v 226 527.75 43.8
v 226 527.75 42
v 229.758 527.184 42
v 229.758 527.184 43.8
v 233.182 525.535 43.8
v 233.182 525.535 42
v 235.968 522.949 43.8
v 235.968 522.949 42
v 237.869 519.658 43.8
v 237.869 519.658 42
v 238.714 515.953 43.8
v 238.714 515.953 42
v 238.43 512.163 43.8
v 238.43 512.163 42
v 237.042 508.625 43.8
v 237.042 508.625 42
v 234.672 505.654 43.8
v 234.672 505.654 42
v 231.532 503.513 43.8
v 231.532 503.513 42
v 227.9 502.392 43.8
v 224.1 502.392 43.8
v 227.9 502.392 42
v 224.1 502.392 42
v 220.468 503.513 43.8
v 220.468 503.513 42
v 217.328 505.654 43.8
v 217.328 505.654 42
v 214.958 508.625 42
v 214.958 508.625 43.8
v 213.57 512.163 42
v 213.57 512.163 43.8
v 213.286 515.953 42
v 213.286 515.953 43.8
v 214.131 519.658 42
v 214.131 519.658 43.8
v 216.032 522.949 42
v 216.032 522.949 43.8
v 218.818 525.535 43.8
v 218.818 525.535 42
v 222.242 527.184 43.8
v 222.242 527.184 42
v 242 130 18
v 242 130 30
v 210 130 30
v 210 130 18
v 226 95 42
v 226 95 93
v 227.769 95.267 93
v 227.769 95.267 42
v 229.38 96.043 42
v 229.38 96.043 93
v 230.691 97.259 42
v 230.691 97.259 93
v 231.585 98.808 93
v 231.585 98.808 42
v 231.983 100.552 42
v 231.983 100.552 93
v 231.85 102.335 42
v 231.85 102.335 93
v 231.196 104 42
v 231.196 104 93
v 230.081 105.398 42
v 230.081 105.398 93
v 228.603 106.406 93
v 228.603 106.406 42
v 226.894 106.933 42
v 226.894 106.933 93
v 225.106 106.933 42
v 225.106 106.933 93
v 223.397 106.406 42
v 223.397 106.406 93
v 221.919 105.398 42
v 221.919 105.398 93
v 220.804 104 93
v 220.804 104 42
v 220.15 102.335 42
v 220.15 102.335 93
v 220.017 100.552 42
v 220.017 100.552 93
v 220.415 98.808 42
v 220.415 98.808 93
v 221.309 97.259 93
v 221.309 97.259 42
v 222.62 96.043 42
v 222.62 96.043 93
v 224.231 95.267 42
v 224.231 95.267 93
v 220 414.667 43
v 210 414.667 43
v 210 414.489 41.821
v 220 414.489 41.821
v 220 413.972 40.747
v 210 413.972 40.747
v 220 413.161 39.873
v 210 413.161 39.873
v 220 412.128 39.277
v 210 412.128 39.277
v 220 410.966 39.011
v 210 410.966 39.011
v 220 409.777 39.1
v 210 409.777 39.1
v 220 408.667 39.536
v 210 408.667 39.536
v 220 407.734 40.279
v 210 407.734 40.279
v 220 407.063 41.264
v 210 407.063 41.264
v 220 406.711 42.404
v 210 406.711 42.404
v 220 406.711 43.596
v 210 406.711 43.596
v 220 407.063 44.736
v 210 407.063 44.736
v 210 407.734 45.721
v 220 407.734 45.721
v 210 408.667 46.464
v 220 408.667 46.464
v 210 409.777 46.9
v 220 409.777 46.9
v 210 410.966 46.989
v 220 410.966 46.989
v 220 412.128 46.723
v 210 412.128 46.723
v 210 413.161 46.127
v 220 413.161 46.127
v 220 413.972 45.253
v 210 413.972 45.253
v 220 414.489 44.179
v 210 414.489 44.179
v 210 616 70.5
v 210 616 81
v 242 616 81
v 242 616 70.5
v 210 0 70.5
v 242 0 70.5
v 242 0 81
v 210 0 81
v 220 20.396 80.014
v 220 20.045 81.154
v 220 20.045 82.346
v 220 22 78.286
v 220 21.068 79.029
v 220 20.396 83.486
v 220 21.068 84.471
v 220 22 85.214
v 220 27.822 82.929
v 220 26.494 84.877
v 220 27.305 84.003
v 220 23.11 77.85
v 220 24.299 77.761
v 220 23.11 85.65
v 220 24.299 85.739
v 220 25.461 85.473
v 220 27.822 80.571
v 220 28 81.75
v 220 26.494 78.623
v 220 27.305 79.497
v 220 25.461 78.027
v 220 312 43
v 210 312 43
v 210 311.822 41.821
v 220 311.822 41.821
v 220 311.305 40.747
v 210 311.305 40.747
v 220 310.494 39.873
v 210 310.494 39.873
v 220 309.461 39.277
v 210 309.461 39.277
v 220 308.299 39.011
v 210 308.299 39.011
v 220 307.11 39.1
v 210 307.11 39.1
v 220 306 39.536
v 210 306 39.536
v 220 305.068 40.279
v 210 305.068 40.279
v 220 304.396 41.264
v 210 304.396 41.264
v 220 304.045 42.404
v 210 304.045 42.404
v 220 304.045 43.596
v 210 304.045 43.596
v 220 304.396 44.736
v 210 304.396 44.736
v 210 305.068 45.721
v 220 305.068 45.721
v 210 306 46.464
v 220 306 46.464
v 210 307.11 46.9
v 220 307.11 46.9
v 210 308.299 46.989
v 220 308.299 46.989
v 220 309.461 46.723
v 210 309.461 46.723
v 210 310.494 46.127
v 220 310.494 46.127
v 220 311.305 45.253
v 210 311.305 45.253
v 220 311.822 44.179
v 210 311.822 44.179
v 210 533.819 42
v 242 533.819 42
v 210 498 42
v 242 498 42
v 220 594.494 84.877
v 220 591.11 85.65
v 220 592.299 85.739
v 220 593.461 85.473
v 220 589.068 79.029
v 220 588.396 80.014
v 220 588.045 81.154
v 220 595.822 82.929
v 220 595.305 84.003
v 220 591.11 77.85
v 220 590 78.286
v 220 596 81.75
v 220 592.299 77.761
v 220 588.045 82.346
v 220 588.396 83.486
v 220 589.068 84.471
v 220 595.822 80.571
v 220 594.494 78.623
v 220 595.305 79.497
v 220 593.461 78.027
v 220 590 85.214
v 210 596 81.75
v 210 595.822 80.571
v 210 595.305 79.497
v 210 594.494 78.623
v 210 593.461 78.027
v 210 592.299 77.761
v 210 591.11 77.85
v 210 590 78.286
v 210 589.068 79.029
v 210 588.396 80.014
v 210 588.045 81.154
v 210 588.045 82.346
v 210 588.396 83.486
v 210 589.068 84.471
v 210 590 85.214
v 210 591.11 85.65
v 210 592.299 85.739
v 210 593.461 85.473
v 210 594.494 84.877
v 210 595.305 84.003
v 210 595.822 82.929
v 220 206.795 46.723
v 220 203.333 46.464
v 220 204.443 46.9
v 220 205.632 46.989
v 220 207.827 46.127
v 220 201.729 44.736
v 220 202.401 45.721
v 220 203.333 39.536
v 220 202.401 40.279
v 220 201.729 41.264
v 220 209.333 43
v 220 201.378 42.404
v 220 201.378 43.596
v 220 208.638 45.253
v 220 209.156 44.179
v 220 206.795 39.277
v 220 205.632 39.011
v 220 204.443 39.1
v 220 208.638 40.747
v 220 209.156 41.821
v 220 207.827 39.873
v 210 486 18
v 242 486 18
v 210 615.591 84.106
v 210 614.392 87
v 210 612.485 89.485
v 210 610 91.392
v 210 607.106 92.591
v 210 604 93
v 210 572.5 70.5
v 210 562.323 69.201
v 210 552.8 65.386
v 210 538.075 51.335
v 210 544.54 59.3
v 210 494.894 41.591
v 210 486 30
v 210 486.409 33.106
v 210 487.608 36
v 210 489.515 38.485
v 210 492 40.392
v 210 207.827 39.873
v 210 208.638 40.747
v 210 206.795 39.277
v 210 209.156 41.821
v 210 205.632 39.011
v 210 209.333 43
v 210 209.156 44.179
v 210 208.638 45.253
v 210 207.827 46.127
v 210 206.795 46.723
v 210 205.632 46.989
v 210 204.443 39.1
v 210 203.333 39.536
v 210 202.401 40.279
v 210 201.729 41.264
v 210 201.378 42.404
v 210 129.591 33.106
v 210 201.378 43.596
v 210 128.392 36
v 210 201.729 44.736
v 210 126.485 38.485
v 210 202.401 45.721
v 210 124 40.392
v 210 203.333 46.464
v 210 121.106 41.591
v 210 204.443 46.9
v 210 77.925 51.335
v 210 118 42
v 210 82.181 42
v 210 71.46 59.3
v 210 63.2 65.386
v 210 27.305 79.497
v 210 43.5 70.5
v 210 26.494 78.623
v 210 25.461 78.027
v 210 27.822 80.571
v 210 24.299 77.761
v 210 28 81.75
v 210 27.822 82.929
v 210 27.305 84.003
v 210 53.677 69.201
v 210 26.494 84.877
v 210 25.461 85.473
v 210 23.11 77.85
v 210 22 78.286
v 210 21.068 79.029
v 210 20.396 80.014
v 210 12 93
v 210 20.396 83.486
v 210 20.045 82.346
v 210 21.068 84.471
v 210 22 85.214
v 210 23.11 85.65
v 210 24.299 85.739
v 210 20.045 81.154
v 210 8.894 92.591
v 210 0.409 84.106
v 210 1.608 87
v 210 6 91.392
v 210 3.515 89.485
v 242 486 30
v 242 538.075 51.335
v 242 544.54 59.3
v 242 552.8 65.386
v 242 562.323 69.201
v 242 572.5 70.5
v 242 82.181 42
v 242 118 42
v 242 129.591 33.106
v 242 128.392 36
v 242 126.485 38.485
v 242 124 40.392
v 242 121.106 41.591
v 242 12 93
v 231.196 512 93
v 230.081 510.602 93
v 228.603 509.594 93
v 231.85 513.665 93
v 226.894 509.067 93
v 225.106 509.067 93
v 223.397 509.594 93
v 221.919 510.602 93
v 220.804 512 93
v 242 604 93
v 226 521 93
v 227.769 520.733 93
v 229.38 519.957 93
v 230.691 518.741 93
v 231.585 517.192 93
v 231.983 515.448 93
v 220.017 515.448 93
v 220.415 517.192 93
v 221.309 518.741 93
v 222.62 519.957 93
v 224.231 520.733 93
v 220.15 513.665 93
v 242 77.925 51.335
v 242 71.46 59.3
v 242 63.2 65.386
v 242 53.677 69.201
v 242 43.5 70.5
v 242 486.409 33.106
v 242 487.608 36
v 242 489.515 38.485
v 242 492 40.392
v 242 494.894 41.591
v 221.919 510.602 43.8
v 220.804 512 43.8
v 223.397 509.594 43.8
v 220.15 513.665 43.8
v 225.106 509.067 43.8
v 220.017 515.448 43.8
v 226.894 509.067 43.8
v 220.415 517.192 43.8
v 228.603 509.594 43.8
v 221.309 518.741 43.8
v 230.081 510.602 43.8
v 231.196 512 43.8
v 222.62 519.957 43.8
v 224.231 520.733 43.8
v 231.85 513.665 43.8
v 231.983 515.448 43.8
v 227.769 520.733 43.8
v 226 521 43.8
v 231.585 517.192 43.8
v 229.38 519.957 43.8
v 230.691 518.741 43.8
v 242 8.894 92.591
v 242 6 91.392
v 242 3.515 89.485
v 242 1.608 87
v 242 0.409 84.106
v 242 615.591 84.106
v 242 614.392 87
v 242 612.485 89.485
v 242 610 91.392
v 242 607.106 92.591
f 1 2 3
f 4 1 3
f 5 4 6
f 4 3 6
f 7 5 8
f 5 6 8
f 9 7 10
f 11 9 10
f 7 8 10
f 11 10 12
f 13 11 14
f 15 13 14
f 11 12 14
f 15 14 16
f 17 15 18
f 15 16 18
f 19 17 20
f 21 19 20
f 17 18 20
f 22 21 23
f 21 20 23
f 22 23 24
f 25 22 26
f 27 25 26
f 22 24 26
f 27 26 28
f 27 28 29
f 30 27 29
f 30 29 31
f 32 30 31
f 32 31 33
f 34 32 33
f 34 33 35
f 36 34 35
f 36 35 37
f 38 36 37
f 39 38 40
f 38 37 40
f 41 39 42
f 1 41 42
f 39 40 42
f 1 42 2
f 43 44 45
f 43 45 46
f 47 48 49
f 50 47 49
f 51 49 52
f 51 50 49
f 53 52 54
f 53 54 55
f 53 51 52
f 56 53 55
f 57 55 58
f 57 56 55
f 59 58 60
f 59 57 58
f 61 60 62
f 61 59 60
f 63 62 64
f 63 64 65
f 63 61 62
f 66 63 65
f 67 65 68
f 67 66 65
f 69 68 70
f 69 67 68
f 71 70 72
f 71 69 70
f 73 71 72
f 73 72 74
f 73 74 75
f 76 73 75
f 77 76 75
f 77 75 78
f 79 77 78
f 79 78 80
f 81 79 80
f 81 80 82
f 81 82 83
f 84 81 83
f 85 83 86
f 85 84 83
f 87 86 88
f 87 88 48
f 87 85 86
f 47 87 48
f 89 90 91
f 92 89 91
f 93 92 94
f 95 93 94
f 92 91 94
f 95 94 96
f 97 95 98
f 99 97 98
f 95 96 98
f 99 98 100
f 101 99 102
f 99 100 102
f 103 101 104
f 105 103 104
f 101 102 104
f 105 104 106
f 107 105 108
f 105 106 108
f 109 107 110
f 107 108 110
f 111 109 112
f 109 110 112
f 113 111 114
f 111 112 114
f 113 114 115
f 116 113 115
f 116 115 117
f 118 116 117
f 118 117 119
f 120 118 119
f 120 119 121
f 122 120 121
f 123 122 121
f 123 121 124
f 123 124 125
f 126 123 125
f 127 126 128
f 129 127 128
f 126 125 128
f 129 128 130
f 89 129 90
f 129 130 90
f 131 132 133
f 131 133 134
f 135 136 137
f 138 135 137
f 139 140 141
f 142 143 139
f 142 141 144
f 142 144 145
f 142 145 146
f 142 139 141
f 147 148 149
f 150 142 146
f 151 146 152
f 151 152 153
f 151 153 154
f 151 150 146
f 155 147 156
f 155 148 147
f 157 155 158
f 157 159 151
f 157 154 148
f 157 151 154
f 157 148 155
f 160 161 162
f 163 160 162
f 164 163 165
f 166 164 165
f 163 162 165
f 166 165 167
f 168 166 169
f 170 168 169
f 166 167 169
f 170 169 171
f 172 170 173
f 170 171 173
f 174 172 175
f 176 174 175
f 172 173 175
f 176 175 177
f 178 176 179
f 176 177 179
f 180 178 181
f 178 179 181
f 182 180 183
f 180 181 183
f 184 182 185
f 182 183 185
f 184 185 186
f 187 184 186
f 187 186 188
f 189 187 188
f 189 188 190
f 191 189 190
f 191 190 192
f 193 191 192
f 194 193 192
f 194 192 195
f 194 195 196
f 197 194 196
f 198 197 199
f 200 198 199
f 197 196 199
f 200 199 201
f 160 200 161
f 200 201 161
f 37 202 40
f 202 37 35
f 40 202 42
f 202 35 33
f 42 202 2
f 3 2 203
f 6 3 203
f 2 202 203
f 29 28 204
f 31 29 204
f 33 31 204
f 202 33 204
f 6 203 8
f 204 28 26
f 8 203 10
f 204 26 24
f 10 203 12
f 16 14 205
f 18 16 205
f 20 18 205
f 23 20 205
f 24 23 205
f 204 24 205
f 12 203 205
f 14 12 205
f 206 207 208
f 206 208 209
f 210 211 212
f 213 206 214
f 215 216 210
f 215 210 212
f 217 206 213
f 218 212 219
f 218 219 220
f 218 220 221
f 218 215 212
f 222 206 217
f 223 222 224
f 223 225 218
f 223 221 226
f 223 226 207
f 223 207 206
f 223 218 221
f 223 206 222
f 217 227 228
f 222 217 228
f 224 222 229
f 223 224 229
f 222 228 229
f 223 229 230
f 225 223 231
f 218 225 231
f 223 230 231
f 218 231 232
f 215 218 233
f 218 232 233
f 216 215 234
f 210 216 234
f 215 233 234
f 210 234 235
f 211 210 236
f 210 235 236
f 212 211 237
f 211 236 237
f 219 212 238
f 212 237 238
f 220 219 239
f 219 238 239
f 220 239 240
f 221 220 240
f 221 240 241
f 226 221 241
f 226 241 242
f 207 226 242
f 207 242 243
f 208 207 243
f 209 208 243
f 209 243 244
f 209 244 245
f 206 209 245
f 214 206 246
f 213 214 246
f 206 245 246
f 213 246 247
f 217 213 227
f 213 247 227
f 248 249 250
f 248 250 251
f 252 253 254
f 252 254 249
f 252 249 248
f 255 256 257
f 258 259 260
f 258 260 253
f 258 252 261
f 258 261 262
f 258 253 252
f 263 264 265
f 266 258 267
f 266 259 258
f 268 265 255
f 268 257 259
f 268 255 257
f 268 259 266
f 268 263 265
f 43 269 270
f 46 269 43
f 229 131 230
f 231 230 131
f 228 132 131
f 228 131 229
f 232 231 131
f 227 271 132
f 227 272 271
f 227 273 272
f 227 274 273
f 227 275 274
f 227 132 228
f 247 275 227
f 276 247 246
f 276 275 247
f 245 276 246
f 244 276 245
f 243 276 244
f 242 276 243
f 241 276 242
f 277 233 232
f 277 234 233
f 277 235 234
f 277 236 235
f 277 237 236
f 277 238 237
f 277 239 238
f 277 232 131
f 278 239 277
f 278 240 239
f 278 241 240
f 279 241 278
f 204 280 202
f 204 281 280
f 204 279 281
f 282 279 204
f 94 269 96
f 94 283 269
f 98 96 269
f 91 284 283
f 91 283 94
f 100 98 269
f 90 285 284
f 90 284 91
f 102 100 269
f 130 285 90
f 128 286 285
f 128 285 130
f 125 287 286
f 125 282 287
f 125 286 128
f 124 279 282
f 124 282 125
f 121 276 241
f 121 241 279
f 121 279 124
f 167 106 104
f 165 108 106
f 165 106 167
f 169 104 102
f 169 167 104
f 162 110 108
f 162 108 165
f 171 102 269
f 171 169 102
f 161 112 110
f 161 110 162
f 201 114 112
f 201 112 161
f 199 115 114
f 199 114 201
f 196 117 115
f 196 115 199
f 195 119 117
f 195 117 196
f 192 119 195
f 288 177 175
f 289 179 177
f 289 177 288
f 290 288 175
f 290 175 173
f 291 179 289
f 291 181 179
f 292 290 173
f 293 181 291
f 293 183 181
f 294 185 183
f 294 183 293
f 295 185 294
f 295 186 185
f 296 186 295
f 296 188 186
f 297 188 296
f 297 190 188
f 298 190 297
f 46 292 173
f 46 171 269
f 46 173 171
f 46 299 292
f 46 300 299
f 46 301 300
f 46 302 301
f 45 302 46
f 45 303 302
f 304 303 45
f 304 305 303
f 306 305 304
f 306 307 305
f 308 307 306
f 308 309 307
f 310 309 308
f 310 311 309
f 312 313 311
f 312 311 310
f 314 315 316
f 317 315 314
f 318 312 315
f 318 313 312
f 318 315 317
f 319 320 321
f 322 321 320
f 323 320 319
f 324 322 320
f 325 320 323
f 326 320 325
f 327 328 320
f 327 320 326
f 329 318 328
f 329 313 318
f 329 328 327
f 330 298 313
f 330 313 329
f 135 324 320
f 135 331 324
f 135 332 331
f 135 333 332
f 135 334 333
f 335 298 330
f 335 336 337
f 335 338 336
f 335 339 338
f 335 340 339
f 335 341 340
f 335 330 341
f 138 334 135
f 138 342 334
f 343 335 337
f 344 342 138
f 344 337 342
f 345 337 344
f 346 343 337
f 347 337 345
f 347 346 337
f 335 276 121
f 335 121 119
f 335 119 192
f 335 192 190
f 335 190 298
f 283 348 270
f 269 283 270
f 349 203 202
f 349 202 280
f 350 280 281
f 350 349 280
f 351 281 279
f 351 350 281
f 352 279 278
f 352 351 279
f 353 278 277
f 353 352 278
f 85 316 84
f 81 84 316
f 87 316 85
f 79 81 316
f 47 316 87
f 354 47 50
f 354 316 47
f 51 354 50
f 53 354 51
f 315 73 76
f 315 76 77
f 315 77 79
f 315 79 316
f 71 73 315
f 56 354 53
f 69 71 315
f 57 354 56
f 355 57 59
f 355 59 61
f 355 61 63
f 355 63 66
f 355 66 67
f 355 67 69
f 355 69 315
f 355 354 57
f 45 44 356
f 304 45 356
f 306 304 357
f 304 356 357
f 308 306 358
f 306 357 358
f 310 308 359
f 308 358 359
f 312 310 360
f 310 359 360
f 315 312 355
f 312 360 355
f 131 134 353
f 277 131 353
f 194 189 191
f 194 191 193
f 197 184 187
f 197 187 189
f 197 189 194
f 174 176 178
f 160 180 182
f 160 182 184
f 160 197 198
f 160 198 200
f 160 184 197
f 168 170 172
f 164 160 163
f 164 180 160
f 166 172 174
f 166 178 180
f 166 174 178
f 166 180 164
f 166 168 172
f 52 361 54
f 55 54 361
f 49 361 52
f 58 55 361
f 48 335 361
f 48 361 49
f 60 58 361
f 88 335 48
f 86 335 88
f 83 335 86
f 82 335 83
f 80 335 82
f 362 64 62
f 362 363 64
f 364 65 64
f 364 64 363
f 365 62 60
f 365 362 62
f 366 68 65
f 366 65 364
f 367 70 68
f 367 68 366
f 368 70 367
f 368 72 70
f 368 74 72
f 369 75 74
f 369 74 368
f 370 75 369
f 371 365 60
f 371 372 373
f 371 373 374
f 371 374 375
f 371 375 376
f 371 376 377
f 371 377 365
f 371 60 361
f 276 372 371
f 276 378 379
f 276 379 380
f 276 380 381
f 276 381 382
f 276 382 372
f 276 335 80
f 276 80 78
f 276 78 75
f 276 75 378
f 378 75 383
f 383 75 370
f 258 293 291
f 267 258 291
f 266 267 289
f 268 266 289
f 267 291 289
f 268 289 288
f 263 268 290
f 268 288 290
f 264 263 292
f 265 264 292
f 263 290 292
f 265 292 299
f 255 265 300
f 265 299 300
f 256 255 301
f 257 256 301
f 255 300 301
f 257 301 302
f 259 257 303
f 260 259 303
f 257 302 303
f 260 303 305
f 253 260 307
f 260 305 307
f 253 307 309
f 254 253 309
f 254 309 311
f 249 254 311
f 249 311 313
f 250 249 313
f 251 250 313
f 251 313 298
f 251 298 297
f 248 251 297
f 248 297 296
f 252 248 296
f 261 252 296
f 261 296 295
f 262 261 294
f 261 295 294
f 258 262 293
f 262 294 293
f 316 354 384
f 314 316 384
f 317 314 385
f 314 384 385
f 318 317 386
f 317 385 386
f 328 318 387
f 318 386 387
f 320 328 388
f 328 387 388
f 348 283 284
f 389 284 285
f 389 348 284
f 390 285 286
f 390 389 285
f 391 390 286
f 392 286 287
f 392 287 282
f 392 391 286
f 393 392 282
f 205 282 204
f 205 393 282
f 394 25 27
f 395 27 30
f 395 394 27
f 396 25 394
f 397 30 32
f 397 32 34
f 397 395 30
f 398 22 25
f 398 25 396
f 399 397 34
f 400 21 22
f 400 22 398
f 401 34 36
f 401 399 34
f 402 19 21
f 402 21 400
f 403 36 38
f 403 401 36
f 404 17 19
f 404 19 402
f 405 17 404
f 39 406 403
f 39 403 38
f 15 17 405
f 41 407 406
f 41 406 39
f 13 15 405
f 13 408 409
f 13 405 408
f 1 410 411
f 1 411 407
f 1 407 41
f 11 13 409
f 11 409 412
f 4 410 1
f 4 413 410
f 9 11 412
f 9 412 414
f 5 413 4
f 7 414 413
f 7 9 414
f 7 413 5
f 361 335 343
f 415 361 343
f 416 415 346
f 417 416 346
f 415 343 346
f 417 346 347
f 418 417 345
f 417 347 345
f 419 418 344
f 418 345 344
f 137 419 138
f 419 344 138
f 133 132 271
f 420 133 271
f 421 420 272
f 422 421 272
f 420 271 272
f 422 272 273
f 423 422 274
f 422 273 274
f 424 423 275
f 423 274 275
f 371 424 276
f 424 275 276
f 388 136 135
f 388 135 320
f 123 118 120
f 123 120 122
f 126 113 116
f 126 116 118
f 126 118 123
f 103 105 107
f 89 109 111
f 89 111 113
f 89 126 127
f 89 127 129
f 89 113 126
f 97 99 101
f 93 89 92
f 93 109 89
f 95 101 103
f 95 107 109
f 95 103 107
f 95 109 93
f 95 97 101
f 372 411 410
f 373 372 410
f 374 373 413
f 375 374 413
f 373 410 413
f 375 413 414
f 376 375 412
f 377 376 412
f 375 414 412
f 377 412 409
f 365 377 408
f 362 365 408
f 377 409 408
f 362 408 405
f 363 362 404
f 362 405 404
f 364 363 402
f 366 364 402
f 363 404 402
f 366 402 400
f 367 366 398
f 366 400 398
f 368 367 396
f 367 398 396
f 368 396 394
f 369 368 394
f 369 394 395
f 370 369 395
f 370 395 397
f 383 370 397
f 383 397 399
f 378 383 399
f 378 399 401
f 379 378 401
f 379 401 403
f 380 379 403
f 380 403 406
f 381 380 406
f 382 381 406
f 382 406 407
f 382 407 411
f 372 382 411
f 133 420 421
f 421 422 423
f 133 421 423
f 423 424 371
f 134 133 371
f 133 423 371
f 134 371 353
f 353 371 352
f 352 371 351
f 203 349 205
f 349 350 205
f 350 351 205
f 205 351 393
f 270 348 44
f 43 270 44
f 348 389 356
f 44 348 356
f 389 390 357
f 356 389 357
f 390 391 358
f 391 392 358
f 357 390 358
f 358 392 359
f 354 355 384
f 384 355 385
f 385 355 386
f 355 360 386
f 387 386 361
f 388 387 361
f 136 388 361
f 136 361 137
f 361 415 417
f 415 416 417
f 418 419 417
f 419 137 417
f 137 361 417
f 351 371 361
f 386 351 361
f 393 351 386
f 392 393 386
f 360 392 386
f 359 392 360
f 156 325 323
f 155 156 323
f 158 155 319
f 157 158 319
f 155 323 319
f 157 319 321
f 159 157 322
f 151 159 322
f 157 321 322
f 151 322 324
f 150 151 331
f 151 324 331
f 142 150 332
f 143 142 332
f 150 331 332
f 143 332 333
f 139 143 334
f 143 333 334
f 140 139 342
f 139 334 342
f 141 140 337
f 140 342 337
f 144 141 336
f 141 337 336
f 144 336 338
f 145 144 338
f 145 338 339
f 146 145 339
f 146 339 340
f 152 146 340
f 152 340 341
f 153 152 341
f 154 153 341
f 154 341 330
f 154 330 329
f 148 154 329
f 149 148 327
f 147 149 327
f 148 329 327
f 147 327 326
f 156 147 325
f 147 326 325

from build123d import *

# Parameters (mm, degrees)
PAD027_DEPTH            = 32
POCKET047_DEPTH         = 32
POCKET048_DEPTH         = 32
SKETCH079_R             = 4
POCKET049_DEPTH         = 10
SKETCH080_R             = 6
POCKET050_DEPTH         = 51
SKETCH081_R             = 12.75
POCKET051_DEPTH         = 1.8
BODY026_ROLL_ANGLE      = 90
BODY026_PLACEMENT_ANGLE = 90


with BuildPart() as part:
    # Sketch076 → Pad027 (new body)
    with BuildSketch(Plane.XY):
        with BuildLine():
            Line((-296, 75), (296, 75))
            ThreePointArc((308, 63), (304.485281, 71.485281), (296, 75))
            Line((308, 63), (308, 0))
            Line((308, 0), (-308, 0))
            Line((-308, 0), (-308, 63))
            ThreePointArc((-296, 75), (-304.485281, 71.485281), (-308, 63))
        make_face()
    extrude(amount=PAD027_DEPTH)

    # Sketch077 (on Face8 of Pad027) → Pocket047 (cut)
    with BuildSketch(Plane.XY.offset(32)):
        with BuildLine():
            Line((-308, 24), (-190, 24))
            ThreePointArc((-178, 12), (-181.514719, 20.485281), (-190, 24))
            Line((-178, 12), (-178, 0))
            Line((-178, 0), (-308, 0))
            Line((-308, 0), (-308, 24))
        make_face()
    pocket047 = extrude(amount=-POCKET047_DEPTH, mode=Mode.SUBTRACT)

    # Mirrored018: Pocket047 across Sketch077 V_Axis
    add(pocket047.mirror(Plane(origin=(0, 0, 32), x_dir=(0, 0, 1), z_dir=(1, 0, 0))), mode=Mode.SUBTRACT)

    # Sketch078 (on Face4 of Mirrored018) → Pocket048 (cut)
    with BuildSketch(Plane.XY.offset(32)):
        with BuildLine():
            ThreePointArc((-264.5, -28.5), (-224, 12), (-264.5, 52.5))
            Line((-345.5, 52.5), (-264.5, 52.5))
            Line((-345.5, -28.5), (-345.5, 52.5))
            Line((-264.5, -28.5), (-345.5, -28.5))
        make_face()
    pocket048 = extrude(amount=-POCKET048_DEPTH, mode=Mode.SUBTRACT)

    # Mirrored019: Pocket048 across Sketch078 V_Axis
    add(pocket048.mirror(Plane(origin=(0, 0, 32), x_dir=(0, 0, 1), z_dir=(1, 0, 0))), mode=Mode.SUBTRACT)

    # Sketch079 (on Face2 of Mirrored019) → Pocket049 (cut)
    with BuildSketch(Plane(origin=(0, 0, 0), x_dir=(1, 0, 0), z_dir=(0, 0, -1))):
        with Locations((-284, -63.75)):
            Circle(SKETCH079_R)
        with Locations((-102.666667, -25)):
            Circle(SKETCH079_R)
        with Locations((0, -25)):
            Circle(SKETCH079_R)
        with Locations((102.666667, -25)):
            Circle(SKETCH079_R)
        with Locations((284, -63.75)):
            Circle(SKETCH079_R)
    extrude(amount=-POCKET049_DEPTH, mode=Mode.SUBTRACT)

    # Sketch080 (on Face9 of Pocket049) → Pocket050 (cut)
    with BuildSketch(Plane.XZ.offset(-24)):
        with Locations((207, 16)):
            Circle(SKETCH080_R)
    pocket050 = extrude(amount=-POCKET050_DEPTH, mode=Mode.SUBTRACT)

    # Sketch081 (on Face9 of Pocket050) → Pocket051 (cut)
    with BuildSketch(Plane.XZ.offset(-24)):
        with Locations((207, 16)):
            Circle(SKETCH081_R)
    extrude(amount=-POCKET051_DEPTH, mode=Mode.SUBTRACT)

    # Mirrored020: Pocket050 across Sketch080 V_Axis
    add(pocket050.mirror(Plane(origin=(0, 24, 0), x_dir=(0, -1, 0), z_dir=(1, 0, 0))), mode=Mode.SUBTRACT)


with BuildPart() as part_1:
    # Body026 roll: moved
    add(part.part.rotate(Axis((0, 0, 0), (1, 0, 0)), BODY026_ROLL_ANGLE))


with BuildPart() as part_2:
    # Body026 placement: moved
    add(part_1.part.moved(Location((210, 308, 18))).rotate(Axis((210, 308, 18), (0, 0, 1)), BODY026_PLACEMENT_ANGLE))


solid = part_2.part
